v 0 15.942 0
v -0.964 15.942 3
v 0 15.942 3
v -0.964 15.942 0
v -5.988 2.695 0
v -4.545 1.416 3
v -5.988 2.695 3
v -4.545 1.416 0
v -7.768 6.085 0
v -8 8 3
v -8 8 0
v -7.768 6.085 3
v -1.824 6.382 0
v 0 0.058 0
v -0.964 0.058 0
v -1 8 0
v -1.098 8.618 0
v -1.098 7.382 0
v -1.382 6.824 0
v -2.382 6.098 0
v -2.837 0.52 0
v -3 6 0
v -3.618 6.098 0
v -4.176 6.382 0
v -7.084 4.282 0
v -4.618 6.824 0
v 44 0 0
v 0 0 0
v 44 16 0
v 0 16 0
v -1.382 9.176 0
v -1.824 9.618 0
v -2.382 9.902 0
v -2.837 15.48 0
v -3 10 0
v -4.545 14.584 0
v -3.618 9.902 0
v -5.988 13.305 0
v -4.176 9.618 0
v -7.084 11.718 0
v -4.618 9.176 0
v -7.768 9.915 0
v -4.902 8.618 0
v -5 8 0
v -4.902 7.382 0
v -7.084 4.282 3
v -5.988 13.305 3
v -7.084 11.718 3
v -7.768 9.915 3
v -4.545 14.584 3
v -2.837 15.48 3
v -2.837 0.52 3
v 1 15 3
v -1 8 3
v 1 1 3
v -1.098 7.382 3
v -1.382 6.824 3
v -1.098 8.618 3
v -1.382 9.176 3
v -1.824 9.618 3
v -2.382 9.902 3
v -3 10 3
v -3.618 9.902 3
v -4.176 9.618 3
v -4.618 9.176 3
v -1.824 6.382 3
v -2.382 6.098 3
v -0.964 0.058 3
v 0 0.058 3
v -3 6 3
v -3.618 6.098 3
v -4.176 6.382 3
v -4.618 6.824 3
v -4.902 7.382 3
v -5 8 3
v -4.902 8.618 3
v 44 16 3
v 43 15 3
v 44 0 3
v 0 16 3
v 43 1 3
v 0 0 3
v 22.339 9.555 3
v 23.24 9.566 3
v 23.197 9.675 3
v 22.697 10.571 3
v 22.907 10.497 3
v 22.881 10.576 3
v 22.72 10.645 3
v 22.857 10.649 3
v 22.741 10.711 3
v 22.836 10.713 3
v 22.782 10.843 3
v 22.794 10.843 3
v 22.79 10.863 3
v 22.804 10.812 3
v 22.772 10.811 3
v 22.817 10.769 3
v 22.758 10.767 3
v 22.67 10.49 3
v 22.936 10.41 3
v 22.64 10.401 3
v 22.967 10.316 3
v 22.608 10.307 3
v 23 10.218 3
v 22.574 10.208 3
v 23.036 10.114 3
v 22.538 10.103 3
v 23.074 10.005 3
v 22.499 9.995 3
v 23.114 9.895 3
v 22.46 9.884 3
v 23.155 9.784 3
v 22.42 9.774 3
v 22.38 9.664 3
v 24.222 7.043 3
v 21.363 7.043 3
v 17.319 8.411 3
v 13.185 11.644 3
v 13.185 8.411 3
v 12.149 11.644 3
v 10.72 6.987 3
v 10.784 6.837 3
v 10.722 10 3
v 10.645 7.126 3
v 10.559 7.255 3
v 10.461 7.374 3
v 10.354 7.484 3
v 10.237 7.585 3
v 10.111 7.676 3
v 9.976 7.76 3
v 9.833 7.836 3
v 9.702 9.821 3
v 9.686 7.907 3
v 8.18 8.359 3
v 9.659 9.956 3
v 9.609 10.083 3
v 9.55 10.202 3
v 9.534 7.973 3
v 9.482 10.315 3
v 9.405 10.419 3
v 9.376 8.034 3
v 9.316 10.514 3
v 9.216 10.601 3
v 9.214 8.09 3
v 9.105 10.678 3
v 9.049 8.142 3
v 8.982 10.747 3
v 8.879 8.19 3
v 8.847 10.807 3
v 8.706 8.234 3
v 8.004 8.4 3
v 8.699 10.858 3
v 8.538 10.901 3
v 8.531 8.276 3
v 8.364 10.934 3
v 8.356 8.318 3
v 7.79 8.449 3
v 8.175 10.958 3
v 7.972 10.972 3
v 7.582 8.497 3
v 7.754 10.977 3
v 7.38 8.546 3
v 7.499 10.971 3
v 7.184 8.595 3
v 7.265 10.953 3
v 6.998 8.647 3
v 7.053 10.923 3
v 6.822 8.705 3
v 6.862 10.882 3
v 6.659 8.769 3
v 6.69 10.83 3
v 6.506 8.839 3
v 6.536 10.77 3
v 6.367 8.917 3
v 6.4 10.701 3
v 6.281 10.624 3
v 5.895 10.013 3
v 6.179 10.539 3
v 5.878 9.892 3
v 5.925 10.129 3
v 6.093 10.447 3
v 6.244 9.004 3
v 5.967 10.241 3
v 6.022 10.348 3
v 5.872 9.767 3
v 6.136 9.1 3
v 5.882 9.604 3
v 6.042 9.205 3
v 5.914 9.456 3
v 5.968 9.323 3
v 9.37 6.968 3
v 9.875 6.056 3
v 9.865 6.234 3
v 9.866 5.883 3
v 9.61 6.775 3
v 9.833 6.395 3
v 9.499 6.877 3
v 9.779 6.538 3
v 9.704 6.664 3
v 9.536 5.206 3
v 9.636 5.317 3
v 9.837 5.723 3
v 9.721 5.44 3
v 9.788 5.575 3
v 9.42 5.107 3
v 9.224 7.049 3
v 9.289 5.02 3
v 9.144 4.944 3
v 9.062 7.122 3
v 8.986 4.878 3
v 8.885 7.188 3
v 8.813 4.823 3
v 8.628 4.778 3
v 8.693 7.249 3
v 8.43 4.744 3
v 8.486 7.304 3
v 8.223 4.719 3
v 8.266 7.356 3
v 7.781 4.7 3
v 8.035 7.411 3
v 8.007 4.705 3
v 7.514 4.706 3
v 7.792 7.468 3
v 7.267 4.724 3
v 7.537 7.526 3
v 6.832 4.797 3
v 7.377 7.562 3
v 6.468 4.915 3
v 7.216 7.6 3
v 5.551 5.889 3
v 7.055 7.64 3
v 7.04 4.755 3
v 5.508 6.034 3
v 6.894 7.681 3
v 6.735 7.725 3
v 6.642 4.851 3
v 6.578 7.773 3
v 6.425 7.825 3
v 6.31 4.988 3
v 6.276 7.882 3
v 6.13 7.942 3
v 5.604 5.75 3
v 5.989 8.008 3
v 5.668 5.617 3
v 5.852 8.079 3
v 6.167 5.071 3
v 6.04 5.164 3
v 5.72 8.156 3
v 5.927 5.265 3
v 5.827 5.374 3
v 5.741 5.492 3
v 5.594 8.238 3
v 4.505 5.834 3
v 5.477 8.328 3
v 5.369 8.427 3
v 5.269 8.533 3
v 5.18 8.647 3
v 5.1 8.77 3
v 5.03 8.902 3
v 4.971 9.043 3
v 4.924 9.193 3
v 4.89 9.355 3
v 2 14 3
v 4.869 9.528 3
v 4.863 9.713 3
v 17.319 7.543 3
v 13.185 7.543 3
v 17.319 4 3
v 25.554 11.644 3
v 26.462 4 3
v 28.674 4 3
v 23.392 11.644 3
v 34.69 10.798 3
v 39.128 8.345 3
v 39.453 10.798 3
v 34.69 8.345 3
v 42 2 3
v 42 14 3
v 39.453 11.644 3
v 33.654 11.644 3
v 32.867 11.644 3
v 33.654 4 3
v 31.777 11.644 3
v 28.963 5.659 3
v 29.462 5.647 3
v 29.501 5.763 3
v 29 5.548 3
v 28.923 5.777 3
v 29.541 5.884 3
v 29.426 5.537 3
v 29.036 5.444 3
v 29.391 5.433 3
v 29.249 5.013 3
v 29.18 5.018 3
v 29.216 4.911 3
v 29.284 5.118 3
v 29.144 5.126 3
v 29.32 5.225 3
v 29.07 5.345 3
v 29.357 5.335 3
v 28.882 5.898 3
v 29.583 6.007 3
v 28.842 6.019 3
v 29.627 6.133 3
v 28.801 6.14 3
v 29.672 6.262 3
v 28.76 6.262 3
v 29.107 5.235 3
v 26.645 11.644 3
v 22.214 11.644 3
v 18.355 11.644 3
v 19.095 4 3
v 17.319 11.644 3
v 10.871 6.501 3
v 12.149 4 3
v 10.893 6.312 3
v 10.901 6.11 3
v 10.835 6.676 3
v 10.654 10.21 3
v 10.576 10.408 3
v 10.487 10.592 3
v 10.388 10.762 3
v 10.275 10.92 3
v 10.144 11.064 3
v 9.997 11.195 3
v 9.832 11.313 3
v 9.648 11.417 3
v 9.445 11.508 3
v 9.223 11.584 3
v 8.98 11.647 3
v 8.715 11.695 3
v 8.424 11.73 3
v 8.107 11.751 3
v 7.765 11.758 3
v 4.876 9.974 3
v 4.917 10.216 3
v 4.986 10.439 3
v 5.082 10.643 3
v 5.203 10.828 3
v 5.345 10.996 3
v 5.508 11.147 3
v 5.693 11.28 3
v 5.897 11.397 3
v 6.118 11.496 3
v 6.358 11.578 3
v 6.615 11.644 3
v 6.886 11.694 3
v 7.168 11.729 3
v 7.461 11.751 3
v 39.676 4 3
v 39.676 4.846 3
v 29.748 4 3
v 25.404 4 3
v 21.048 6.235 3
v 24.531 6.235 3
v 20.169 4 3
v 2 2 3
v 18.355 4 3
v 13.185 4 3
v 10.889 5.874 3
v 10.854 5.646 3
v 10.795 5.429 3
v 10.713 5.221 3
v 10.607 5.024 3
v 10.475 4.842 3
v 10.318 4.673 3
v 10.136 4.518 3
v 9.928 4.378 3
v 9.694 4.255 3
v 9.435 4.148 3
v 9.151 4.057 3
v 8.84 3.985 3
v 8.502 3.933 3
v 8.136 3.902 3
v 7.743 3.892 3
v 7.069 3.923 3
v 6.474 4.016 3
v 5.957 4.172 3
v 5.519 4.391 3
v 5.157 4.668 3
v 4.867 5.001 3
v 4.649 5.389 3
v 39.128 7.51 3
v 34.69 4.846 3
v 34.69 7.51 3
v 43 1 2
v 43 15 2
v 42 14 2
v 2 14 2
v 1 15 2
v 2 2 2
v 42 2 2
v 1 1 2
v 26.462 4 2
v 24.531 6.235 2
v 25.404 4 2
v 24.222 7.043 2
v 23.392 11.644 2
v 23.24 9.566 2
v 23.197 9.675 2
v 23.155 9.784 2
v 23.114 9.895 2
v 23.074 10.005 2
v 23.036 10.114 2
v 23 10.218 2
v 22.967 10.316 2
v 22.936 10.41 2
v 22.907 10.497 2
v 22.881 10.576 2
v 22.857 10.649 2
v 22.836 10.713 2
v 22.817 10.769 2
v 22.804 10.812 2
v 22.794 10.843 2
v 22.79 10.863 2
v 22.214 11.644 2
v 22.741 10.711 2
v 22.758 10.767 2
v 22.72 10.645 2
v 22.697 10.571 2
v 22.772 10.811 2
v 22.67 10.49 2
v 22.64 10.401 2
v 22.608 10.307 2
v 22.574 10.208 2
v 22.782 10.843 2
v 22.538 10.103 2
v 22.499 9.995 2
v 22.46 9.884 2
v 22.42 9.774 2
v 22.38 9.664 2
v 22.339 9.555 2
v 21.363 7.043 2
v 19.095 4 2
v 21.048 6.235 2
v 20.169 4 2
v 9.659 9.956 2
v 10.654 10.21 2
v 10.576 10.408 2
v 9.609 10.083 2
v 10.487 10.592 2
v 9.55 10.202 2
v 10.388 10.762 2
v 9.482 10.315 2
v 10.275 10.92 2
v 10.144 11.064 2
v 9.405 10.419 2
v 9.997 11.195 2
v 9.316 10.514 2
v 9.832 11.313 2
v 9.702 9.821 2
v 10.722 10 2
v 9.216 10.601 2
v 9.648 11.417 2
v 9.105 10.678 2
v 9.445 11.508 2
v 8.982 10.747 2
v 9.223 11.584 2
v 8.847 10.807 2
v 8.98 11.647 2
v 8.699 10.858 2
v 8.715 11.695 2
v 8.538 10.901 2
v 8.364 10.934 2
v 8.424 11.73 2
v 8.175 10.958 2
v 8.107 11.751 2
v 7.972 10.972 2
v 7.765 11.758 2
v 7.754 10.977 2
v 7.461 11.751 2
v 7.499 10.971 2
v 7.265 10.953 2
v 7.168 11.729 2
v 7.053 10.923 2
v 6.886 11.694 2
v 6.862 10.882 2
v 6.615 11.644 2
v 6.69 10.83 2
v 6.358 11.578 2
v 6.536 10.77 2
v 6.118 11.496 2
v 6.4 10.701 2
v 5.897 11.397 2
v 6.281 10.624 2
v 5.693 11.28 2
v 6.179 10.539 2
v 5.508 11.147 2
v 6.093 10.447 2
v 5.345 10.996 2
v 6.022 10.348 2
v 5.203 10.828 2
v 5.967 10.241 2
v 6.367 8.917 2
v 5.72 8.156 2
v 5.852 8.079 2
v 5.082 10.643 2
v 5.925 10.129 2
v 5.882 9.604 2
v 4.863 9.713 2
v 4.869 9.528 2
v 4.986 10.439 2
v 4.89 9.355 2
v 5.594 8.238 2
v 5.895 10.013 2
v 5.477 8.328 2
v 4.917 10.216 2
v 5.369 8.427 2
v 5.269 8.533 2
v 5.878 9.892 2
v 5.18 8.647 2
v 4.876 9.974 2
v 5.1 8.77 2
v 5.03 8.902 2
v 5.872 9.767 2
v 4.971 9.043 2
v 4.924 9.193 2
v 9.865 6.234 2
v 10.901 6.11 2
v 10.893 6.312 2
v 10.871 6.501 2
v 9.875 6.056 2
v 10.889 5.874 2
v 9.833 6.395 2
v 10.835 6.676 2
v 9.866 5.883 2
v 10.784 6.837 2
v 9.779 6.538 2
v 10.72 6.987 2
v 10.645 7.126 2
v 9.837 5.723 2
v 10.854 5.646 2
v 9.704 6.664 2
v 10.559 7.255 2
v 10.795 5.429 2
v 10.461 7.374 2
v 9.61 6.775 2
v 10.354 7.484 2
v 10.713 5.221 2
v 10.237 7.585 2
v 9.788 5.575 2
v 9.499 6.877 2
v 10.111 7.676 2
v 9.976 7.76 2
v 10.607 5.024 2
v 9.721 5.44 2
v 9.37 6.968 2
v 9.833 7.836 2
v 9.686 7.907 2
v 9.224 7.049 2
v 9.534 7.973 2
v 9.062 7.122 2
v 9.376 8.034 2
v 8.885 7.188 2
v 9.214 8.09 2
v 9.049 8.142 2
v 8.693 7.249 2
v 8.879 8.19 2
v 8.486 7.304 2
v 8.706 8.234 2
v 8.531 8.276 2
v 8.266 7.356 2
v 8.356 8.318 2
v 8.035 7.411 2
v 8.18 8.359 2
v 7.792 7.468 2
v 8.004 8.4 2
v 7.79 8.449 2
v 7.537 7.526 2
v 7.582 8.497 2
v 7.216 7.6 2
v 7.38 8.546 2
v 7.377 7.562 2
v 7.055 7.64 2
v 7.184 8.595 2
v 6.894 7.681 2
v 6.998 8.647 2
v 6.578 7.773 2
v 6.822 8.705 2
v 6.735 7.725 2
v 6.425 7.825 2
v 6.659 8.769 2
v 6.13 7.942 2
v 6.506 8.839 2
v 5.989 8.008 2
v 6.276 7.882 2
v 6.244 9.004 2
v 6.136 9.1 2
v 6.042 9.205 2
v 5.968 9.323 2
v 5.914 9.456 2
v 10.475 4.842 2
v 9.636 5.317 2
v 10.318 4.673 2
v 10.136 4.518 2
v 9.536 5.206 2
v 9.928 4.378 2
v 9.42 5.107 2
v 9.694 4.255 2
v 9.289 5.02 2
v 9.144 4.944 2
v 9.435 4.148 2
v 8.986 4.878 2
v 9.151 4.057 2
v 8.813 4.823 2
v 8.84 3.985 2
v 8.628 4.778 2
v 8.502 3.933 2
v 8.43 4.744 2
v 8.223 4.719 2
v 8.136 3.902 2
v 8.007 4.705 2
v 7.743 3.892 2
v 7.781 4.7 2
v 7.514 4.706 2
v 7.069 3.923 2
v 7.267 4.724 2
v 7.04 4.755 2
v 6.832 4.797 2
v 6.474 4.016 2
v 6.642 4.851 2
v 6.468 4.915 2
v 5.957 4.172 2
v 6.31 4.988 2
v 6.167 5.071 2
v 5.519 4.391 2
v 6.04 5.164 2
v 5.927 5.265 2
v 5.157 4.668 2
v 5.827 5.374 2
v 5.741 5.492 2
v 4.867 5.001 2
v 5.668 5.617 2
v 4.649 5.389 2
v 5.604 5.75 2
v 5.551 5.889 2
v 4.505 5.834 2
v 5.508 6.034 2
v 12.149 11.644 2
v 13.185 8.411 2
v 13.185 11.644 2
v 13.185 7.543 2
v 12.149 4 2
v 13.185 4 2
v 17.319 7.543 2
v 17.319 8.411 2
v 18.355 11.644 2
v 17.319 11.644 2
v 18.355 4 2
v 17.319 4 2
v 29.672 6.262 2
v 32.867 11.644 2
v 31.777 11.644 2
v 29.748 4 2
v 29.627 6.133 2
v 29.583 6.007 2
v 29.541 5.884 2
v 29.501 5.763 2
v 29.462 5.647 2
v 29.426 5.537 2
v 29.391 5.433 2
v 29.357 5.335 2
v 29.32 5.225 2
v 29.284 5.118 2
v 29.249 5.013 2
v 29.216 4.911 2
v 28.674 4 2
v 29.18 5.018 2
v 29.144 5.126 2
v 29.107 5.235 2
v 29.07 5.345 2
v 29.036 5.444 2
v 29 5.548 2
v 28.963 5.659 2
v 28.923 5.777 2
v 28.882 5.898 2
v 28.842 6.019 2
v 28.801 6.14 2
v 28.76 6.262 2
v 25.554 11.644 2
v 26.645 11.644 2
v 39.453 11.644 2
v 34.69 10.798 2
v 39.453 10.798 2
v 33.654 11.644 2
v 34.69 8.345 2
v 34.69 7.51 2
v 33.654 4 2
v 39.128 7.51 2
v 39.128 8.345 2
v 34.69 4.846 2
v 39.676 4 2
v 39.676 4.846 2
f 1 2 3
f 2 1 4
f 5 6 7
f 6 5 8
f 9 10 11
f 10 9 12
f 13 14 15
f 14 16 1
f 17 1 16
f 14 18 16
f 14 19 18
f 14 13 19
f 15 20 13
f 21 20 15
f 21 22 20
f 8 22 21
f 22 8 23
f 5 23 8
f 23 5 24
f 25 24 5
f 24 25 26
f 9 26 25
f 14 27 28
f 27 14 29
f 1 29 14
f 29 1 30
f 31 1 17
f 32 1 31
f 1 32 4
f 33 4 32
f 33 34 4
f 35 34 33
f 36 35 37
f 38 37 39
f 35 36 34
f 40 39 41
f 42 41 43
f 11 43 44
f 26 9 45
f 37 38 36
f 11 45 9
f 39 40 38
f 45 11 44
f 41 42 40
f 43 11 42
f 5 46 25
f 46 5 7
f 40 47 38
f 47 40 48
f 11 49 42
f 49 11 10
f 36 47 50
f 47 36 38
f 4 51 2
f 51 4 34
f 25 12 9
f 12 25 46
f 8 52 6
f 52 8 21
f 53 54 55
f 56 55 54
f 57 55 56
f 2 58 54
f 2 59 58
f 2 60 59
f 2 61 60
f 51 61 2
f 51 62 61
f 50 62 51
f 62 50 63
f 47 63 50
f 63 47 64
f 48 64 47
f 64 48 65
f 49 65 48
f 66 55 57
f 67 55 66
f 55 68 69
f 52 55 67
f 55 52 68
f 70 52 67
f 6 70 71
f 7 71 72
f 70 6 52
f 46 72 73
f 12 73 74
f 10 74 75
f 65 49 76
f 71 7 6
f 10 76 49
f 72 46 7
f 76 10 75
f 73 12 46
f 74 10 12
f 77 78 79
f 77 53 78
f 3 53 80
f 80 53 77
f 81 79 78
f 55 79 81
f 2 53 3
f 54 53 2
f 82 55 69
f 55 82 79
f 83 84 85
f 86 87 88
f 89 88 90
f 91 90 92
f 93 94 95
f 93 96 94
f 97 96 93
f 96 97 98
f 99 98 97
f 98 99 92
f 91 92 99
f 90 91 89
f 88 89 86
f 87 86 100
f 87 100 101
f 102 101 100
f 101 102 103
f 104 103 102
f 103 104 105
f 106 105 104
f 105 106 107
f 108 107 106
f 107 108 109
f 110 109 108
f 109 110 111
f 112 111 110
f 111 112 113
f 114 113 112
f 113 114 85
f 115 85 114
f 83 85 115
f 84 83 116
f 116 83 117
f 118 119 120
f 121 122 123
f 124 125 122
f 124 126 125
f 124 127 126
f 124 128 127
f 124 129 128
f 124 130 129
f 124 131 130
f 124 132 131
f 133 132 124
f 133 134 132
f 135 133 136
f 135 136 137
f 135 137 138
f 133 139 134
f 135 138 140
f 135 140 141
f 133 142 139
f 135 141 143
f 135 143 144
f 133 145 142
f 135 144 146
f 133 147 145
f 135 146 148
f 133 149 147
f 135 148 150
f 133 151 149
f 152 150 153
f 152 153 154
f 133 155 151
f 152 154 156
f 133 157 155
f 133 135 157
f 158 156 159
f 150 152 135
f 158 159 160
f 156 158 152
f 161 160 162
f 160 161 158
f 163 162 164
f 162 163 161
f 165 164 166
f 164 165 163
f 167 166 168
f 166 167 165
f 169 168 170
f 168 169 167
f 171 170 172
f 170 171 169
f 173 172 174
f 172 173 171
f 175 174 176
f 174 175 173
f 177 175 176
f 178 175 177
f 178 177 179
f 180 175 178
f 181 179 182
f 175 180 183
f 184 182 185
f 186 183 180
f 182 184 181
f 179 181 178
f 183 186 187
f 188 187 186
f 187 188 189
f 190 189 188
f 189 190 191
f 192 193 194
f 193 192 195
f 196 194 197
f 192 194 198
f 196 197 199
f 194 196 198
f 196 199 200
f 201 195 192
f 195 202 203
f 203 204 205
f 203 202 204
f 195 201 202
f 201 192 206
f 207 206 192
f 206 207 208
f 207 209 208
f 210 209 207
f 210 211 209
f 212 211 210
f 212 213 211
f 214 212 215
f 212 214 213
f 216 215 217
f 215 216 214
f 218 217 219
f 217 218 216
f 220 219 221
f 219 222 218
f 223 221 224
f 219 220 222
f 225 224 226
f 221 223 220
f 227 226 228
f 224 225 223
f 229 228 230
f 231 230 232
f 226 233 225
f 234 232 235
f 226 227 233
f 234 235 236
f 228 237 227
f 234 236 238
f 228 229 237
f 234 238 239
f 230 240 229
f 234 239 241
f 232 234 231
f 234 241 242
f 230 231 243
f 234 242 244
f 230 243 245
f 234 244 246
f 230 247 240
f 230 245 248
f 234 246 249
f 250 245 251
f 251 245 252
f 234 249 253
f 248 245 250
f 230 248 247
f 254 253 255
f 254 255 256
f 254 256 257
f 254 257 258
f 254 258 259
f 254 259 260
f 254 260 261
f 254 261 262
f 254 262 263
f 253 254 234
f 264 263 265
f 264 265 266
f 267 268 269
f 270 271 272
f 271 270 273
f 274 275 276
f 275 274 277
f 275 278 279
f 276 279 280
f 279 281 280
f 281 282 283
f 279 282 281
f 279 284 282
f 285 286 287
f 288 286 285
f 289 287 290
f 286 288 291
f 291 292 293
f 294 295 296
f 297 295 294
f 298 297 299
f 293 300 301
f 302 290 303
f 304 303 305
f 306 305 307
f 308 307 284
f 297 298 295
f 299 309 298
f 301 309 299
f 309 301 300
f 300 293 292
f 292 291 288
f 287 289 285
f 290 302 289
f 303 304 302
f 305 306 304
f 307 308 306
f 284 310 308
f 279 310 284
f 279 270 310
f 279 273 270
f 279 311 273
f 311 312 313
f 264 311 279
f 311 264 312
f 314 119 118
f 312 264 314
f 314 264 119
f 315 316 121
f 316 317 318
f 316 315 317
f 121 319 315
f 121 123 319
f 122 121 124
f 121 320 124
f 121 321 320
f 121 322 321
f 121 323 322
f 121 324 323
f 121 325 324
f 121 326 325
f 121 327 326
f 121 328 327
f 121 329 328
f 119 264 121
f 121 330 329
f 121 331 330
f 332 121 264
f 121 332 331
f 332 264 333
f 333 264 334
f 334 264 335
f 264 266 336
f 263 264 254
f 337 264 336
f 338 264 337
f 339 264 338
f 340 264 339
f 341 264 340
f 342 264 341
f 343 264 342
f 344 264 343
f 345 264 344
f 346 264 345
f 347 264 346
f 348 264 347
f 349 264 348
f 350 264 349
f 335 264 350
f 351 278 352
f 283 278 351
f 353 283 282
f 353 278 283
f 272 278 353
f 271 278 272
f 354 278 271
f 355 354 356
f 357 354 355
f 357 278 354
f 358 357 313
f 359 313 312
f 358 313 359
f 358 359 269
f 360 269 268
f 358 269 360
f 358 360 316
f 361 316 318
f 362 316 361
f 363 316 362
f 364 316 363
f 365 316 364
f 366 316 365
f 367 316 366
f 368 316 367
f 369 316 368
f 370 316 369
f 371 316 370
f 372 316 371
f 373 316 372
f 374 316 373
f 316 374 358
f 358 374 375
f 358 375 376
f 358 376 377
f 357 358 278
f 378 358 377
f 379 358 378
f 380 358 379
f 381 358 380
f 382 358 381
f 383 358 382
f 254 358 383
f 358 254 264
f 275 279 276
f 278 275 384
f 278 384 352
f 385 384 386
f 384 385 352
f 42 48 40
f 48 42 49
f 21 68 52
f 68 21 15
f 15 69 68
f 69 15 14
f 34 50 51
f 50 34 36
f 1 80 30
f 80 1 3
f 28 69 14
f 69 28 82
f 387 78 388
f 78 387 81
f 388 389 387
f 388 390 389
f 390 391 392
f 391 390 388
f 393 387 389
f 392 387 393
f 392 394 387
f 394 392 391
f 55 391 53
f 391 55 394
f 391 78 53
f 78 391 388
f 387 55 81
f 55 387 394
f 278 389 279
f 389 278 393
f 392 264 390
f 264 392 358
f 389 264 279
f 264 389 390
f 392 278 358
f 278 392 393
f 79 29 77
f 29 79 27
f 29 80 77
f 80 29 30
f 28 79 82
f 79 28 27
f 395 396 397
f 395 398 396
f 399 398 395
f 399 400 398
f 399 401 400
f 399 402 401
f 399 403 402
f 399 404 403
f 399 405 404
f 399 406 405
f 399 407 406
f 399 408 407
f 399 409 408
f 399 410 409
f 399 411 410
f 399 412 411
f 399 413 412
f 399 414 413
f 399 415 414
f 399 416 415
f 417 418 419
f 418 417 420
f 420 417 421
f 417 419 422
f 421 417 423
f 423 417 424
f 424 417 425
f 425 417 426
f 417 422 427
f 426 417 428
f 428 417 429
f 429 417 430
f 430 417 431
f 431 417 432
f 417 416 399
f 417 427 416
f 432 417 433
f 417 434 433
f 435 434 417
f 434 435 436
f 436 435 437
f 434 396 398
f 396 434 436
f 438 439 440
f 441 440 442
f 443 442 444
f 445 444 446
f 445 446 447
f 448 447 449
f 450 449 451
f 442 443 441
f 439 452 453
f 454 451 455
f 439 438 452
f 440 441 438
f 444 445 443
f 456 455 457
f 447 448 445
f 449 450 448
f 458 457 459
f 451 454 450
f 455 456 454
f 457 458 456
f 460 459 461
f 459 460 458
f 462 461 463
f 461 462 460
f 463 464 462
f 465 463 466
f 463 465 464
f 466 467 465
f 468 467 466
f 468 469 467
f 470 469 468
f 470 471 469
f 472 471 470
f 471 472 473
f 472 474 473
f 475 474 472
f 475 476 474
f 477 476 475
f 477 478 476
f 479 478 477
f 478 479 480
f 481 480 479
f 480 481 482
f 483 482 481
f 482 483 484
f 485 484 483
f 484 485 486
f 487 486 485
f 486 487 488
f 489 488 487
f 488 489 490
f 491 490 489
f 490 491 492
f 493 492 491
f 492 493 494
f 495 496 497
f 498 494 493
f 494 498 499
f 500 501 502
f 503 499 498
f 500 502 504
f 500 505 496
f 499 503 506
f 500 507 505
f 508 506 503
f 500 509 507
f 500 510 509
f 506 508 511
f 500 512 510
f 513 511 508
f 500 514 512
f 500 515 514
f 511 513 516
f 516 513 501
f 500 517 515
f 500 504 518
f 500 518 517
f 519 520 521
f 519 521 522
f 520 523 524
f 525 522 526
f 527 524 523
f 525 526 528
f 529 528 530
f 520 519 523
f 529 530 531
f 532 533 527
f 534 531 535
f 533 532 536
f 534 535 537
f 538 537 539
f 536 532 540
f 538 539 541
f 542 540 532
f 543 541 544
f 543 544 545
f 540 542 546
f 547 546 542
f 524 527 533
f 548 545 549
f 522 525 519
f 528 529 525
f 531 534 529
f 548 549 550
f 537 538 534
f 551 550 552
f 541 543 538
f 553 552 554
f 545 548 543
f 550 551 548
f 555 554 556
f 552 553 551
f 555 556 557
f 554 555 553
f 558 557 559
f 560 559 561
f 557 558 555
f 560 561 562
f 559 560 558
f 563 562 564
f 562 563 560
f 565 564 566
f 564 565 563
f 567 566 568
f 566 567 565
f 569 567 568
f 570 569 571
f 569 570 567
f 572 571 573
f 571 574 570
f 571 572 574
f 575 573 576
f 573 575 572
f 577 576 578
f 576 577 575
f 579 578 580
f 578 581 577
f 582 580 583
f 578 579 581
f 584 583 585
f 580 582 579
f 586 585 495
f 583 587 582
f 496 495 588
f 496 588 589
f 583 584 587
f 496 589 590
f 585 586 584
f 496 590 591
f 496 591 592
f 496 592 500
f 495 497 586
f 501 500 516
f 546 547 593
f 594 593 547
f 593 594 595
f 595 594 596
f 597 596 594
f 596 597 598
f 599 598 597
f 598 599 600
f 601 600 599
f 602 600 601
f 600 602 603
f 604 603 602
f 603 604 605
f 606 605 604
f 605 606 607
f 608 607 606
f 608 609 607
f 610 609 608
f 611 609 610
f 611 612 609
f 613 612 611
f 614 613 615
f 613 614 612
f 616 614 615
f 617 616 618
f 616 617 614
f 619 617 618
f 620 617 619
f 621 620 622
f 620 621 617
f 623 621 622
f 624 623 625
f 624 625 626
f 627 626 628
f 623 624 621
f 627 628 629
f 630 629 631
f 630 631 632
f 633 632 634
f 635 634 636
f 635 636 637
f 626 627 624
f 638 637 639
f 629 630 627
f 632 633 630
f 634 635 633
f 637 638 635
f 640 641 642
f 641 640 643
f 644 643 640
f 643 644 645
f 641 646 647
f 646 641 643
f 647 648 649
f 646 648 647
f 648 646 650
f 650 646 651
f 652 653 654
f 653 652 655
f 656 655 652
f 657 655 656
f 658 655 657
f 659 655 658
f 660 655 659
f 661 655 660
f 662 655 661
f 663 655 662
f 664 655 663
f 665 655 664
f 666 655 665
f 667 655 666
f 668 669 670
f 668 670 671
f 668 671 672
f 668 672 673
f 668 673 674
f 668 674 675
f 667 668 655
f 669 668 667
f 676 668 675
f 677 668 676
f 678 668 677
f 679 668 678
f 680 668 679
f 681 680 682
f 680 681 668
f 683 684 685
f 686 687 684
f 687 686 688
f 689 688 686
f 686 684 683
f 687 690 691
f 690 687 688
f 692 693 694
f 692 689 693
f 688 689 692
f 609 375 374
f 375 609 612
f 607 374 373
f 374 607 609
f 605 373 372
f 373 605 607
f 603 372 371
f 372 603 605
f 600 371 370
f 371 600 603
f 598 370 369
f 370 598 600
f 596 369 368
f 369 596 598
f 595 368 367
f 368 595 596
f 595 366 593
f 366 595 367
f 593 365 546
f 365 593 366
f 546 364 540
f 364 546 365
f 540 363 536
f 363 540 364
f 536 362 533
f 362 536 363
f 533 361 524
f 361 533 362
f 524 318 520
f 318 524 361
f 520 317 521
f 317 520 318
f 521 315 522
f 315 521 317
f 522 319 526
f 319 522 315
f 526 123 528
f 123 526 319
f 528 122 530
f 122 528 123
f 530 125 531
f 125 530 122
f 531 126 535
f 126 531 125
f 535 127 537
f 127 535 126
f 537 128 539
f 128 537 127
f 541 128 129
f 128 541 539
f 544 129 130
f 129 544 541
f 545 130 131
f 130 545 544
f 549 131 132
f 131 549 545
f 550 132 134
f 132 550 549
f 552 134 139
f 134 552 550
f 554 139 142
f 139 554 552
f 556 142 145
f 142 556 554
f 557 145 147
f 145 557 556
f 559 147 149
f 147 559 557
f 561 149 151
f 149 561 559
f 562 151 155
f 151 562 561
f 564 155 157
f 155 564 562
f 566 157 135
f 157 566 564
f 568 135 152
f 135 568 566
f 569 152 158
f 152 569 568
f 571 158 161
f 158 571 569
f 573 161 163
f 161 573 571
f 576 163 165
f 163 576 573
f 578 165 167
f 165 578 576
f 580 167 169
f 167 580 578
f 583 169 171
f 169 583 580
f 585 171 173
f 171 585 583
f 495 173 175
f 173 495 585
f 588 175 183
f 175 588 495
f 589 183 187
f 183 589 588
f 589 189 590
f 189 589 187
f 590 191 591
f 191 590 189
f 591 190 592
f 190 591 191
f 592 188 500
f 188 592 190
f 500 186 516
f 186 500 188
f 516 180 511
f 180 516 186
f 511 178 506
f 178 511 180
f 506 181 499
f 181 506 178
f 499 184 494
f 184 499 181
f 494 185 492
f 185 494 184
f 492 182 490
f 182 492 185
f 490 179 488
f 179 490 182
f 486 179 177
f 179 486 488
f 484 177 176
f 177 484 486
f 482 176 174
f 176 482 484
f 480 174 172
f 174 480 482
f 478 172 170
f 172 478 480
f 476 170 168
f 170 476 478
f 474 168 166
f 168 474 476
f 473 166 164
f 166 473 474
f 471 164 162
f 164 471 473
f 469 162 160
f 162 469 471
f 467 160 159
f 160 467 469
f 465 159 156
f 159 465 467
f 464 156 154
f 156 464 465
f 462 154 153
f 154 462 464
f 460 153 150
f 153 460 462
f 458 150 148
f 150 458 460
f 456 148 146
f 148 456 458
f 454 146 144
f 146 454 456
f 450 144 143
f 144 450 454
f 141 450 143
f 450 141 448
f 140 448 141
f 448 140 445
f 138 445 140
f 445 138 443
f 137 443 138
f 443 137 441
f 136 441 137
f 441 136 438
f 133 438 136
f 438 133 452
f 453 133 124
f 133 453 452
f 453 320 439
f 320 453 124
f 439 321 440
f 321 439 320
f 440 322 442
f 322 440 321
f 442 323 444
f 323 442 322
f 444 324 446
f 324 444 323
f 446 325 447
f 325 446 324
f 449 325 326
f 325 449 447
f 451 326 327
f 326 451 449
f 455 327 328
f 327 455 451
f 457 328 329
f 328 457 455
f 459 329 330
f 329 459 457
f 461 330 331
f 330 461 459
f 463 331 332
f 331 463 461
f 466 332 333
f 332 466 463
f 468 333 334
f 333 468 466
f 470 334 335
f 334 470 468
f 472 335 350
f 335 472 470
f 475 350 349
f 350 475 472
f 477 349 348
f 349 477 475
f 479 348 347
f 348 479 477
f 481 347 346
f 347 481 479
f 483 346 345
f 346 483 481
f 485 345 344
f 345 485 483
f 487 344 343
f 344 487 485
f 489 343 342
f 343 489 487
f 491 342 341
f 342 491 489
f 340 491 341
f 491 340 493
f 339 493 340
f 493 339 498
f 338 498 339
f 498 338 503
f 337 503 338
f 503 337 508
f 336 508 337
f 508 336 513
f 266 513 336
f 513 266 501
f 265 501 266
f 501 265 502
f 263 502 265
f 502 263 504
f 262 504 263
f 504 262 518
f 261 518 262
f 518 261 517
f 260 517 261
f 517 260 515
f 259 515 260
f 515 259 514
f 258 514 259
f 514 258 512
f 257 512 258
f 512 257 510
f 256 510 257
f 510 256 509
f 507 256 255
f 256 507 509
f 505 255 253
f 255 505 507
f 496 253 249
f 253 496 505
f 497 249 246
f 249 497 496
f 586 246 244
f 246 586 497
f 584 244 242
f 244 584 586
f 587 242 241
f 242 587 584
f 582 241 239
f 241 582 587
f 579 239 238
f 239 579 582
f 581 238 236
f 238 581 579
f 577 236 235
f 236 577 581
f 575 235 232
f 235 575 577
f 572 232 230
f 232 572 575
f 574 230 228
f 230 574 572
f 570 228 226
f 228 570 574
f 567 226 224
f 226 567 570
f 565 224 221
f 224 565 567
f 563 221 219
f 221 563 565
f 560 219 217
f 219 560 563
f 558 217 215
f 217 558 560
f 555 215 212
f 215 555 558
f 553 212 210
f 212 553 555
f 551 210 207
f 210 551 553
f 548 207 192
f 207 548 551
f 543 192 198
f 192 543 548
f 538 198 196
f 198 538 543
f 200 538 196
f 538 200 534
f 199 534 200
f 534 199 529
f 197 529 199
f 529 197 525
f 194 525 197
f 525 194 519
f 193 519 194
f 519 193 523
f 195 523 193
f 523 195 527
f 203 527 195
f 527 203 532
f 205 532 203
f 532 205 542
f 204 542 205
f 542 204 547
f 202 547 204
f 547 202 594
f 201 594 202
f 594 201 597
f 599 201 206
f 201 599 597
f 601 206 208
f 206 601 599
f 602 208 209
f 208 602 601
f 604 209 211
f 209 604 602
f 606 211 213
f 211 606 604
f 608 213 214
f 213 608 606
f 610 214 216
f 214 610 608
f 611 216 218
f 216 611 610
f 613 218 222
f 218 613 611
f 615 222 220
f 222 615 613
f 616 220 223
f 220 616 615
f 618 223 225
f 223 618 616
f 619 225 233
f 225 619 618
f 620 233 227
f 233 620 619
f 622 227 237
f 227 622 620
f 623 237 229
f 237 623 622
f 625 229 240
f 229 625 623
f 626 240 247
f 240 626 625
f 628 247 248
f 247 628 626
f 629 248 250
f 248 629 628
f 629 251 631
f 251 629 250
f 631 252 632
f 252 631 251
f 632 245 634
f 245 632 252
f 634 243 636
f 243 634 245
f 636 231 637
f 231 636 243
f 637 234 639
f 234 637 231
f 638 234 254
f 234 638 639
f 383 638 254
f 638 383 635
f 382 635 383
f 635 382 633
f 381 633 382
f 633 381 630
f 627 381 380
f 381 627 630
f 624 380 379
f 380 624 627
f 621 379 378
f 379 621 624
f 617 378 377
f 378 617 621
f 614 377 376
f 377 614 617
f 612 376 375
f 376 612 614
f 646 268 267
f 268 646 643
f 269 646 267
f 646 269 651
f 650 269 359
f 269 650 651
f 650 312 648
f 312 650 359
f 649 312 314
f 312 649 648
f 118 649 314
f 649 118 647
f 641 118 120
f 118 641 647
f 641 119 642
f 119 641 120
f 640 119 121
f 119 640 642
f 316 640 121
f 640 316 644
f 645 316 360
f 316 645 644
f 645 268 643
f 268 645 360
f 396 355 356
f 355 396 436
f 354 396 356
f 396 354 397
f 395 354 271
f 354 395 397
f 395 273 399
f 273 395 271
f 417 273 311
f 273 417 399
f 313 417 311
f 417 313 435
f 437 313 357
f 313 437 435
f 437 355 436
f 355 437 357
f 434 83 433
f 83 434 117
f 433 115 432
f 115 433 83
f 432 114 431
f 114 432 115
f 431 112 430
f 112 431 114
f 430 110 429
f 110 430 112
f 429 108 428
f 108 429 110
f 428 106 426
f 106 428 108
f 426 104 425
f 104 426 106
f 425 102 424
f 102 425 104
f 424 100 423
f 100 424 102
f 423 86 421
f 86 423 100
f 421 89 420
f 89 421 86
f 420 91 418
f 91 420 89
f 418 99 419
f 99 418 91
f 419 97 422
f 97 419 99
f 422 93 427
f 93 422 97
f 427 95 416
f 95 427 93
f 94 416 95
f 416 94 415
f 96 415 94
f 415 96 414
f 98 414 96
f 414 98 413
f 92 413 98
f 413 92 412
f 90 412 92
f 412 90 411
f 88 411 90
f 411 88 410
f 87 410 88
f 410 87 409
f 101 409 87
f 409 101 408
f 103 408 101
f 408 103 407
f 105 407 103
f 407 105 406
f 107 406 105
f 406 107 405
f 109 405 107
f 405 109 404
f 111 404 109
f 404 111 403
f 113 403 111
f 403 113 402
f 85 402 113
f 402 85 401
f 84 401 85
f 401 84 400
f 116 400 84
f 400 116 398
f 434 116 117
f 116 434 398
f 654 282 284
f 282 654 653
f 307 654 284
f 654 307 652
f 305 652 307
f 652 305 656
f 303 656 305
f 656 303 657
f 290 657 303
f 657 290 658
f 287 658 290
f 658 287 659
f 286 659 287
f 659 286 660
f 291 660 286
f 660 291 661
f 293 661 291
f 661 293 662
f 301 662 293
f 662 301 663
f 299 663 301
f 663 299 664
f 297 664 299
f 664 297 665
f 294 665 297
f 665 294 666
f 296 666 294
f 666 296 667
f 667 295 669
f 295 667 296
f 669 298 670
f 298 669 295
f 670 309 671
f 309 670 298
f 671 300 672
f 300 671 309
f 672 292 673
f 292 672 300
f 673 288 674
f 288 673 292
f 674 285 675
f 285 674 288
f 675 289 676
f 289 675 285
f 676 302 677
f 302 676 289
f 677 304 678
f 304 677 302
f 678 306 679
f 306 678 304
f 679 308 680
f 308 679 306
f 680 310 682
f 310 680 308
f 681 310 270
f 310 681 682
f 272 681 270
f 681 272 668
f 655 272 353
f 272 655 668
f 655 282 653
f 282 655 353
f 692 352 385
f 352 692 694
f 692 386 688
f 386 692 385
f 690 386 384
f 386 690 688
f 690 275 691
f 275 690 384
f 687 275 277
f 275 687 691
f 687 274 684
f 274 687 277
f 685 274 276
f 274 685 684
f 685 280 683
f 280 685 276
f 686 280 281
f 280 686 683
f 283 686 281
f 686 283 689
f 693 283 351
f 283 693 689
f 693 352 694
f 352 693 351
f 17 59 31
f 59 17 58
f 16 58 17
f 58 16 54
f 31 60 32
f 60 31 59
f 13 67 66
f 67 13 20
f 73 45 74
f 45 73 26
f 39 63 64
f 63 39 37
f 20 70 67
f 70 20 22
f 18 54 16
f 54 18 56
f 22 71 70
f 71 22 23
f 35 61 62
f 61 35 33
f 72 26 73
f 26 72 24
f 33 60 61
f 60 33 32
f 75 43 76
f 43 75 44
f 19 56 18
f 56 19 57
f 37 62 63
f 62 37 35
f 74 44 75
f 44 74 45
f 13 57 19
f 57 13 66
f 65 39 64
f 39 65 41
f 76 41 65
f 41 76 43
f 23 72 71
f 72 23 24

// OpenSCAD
difference() {
    union() {
        translate([0, 8, 0])
            difference() {
                linear_extrude(3)
                    circle(d=16);
                translate([0, -8, -1])
                    cube([50, 16, 5]);
            }
        
        difference(){
            cube([44, 16, 3]);
            translate([4, 4, 2])
                linear_extrude(3)
                    text("SHAVE", size=8);
            
            translate([1, 1, 2])
            difference() {
                cube([42, 14, 5]);
                    translate([1, 1, -1])
                        cube([40, 12, 5]);
            }
        }
    }
    translate([-3, 8, -1])
        rotate([0, 0, 0])
            cylinder(h=10, d=4, $fn=20);
}
